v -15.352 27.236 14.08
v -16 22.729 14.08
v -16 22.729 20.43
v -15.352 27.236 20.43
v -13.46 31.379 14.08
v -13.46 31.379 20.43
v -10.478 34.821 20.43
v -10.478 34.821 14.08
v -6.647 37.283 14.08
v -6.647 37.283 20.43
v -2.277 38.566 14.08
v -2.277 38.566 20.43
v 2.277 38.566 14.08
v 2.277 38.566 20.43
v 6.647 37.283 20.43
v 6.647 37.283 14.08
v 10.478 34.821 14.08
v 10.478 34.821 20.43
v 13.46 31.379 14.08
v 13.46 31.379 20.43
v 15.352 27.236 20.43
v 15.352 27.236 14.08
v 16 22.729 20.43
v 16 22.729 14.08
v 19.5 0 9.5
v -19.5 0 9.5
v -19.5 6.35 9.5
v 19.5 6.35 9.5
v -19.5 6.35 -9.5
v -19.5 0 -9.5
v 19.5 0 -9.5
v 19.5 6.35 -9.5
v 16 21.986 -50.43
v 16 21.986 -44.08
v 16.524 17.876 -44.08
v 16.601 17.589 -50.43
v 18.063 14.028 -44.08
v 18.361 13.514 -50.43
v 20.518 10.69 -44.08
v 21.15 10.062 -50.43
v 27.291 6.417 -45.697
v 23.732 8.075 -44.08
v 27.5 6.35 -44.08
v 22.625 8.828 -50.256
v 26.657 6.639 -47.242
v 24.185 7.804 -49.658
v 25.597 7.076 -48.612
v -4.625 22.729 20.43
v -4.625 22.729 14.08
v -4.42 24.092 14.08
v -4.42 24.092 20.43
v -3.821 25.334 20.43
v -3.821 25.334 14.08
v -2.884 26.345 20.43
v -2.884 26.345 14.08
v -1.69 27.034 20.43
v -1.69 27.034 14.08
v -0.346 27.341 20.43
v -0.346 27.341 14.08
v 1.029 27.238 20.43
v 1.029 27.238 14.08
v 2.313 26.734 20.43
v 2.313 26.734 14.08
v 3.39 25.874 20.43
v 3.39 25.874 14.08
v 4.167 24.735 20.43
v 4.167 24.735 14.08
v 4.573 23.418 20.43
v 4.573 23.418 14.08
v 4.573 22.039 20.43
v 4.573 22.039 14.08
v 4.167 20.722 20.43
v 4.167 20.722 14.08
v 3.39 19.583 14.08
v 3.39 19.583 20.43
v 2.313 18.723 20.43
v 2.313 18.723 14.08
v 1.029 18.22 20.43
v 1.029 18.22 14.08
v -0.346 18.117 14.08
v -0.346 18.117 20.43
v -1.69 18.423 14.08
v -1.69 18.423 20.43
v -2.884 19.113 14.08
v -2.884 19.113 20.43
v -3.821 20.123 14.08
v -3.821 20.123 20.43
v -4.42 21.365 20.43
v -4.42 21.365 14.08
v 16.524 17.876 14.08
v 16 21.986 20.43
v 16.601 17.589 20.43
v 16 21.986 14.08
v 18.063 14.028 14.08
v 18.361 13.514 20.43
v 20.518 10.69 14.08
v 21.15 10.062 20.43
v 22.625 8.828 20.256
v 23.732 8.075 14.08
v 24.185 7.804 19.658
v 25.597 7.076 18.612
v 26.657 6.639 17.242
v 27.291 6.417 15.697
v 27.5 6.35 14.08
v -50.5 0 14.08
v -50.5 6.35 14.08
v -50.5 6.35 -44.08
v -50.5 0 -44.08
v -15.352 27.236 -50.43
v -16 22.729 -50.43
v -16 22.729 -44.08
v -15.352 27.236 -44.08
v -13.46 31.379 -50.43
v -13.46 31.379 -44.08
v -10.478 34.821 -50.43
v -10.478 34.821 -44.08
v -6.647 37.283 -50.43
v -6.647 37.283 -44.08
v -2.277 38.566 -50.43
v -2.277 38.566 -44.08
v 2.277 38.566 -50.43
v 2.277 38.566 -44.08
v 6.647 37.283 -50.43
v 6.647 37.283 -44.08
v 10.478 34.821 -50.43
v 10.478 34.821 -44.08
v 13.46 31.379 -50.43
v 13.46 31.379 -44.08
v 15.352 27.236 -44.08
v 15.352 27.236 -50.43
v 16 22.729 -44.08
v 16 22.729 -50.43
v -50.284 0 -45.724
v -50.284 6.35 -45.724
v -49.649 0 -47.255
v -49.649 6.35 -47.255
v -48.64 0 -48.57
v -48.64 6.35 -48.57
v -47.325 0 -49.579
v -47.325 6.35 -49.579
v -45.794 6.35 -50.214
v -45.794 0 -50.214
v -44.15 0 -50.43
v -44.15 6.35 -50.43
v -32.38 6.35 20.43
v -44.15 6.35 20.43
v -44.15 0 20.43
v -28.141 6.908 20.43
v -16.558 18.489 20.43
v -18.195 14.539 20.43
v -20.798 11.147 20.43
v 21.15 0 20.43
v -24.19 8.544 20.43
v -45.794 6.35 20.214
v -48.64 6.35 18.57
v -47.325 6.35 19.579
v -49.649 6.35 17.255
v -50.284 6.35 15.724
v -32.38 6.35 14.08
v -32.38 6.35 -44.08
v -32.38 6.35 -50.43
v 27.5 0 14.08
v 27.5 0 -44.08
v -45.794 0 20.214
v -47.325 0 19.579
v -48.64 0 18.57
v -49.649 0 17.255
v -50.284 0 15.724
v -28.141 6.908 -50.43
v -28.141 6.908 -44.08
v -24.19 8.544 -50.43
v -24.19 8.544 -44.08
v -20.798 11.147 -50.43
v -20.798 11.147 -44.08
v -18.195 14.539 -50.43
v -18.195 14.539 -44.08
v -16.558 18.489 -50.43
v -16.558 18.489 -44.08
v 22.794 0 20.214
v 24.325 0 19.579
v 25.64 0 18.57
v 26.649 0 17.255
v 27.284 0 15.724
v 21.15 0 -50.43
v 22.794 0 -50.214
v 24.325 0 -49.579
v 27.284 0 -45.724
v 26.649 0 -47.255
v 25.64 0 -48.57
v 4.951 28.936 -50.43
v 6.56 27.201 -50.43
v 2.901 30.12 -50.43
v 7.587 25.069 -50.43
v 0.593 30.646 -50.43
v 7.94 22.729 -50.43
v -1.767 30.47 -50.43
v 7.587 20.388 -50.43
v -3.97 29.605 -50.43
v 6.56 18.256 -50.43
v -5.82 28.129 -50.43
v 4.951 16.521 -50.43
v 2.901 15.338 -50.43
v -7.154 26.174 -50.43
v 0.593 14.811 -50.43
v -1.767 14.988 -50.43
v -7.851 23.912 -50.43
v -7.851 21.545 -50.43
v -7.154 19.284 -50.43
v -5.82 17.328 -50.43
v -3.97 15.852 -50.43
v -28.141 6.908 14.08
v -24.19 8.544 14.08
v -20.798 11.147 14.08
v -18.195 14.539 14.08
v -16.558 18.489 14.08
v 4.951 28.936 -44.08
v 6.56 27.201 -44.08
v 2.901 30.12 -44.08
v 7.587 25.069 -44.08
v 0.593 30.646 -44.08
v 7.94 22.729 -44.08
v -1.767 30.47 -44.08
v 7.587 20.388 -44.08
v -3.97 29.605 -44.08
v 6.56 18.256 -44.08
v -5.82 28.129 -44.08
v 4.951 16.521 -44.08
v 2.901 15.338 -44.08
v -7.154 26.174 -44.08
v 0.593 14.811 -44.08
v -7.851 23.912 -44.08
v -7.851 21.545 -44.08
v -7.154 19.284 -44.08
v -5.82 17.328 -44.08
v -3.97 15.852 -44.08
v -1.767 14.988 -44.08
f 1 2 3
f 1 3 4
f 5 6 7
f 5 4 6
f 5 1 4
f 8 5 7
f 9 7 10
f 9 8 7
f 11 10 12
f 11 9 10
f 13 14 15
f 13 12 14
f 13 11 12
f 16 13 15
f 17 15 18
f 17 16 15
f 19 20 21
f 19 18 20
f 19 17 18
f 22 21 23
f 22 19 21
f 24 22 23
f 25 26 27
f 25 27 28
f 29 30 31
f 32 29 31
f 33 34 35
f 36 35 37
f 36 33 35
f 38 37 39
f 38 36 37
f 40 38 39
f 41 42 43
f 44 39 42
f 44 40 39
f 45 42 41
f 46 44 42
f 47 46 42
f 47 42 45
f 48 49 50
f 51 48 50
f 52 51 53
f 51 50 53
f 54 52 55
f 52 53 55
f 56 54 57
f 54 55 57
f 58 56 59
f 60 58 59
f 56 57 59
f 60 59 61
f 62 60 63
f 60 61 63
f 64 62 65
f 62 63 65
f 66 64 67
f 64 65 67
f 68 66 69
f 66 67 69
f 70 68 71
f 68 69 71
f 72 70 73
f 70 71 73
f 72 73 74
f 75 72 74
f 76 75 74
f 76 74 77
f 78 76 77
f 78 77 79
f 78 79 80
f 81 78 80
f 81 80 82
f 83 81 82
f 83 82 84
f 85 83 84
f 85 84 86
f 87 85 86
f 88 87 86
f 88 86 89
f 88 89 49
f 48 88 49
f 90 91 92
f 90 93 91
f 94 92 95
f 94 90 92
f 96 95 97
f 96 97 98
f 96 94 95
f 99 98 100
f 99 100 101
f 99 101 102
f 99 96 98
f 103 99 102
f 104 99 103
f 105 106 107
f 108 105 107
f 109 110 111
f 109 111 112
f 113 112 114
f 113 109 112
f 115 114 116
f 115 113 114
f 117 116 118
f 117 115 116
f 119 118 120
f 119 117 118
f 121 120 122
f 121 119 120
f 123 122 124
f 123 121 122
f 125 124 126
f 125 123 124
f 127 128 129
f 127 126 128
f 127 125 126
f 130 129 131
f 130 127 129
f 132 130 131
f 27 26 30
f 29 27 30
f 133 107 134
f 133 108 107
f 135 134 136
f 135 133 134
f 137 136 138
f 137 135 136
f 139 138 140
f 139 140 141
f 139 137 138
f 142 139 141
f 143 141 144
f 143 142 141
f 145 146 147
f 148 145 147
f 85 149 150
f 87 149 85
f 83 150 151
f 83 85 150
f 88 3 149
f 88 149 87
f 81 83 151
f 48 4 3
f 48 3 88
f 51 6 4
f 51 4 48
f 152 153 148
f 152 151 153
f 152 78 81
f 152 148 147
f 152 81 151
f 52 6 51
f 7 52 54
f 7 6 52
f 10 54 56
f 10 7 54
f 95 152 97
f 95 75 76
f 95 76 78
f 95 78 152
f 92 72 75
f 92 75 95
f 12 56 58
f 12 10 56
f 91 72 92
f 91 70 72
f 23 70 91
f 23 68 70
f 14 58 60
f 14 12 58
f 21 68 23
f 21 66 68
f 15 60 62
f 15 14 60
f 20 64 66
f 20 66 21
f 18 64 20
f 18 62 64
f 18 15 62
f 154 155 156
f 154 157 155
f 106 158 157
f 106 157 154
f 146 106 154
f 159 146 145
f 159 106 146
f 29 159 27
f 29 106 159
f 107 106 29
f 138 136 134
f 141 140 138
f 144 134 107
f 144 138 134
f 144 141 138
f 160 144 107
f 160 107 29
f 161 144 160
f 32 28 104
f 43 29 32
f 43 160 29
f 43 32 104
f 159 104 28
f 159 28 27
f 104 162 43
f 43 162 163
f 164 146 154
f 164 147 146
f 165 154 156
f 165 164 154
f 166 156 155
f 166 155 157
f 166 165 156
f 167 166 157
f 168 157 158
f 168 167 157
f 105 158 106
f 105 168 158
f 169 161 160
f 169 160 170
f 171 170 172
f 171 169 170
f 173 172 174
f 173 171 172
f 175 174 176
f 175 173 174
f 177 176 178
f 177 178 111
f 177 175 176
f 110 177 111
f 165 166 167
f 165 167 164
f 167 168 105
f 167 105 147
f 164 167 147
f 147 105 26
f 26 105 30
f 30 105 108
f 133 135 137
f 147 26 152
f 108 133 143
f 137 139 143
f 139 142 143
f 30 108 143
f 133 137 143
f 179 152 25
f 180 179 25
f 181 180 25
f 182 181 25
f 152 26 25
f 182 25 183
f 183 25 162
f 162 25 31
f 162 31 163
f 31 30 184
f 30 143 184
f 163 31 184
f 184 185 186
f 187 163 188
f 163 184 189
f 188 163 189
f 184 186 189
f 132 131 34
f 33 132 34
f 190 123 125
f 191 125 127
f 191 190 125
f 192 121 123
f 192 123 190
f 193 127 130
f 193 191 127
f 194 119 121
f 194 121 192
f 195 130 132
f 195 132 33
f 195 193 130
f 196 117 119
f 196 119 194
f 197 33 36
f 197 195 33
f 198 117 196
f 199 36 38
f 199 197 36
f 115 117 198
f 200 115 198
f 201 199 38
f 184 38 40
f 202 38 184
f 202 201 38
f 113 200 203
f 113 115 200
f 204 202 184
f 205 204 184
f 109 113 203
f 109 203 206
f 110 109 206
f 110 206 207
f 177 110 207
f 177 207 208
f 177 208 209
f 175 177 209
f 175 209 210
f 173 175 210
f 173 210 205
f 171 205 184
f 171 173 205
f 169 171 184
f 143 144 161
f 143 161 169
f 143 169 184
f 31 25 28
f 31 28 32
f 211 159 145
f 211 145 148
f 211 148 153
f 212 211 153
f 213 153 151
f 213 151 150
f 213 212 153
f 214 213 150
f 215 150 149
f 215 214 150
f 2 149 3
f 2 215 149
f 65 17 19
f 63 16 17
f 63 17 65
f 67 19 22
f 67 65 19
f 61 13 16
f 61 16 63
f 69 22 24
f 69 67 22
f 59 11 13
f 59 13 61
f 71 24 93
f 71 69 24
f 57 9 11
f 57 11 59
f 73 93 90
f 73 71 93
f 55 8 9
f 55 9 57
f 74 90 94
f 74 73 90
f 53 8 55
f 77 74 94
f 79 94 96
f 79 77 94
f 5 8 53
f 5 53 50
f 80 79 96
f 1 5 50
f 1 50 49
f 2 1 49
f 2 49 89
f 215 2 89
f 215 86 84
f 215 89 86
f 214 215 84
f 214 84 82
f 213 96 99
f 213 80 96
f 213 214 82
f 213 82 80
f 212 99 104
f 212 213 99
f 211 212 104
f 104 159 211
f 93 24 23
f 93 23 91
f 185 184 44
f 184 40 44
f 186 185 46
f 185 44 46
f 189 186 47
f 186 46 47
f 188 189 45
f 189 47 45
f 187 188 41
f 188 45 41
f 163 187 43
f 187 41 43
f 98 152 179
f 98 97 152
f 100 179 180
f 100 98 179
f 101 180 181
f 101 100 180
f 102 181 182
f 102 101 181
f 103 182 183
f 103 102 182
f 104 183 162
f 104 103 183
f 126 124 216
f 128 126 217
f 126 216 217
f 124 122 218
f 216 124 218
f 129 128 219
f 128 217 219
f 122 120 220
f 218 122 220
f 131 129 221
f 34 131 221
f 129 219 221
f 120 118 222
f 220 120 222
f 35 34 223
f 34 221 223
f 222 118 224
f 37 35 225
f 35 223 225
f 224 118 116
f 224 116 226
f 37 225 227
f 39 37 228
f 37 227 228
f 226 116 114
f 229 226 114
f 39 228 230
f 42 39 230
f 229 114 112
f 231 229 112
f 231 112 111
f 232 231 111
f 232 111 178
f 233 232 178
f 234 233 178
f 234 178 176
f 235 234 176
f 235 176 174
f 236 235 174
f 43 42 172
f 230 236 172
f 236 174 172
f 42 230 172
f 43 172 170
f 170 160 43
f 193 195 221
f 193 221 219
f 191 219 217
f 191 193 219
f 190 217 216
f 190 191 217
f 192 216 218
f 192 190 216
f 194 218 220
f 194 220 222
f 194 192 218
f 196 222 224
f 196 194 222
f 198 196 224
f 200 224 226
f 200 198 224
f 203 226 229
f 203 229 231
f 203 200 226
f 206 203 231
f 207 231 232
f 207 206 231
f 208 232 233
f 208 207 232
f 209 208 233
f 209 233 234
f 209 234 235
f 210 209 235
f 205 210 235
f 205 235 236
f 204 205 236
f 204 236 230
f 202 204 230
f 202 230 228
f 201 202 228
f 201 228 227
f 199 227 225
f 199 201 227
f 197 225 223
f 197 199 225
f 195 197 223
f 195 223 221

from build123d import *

# Parameters (mm, degrees)
SKETCH1_W            = 55
SKETCH1_H            = 70.86
SKETCH1_W_2          = 39
SKETCH1_H_2          = 19
BOSS_EXTRUDE1_DEPTH  = 6.35
SKETCH12_R           = 7.94
BOSS_EXTRUDE11_DEPTH = 6.35
BOSS_EXTRUDE14_START = -6.35
BOSS_EXTRUDE14_DEPTH = 6.35
SKETCH15_W           = 23
SKETCH15_H           = 70.86
BOSS_EXTRUDE13_DEPTH = 6.35
FILLET2_R            = 16.38
FILLET3_R            = 6.35
CUT_EXTRUDE1_REACH   = 92.618
SKETCH17_R           = 4.625


with BuildPart() as part:
    # Sketch1 → Boss-Extrude1 (new body)
    with BuildSketch(Plane(origin=(0, 0, 0), x_dir=(1, 0, 0), z_dir=(0, 1, 0))):
        with Locations((0, 15)):
            Rectangle(SKETCH1_W, SKETCH1_H)
        Rectangle(SKETCH1_W_2, SKETCH1_H_2, mode=Mode.SUBTRACT)
    extrude(amount=BOSS_EXTRUDE1_DEPTH)

    # Sketch12 → Boss-Extrude11 (add)
    with BuildSketch(Plane.XY.offset(-50.43)):
        with BuildLine():
            Line((16, 22.728660684), (16, 6.35))
            Line((16, 6.35), (-16, 6.35))
            Line((-16, 6.35), (-16, 22.728660684))
            ThreePointArc((-16, 22.728660684), (0, 38.728660684), (16, 22.728660684))
        make_face()
        with Locations((0, 22.728660684)):
            Circle(SKETCH12_R, mode=Mode.SUBTRACT)
    extrude(amount=BOSS_EXTRUDE11_DEPTH)

    # Sketch16 → Boss-Extrude14 (add)
    with BuildSketch(Plane.XY.offset(20.43).offset(BOSS_EXTRUDE14_START)):
        with BuildLine():
            Line((-16, 6.35), (-16, 22.728660684))
            ThreePointArc((-16, 22.728660684), (0, 38.728660684), (16, 22.728660684))
            Line((16, 22.728660684), (16, 6.35))
            Line((16, 6.35), (-16, 6.35))
        make_face()
    extrude(amount=BOSS_EXTRUDE14_DEPTH)

    # Sketch15 → Boss-Extrude13 (add)
    with BuildSketch(Plane(origin=(0, 6.35, 0), x_dir=(1, 0, 0), z_dir=(0, 1, 0))):
        with Locations((-39, 15)):
            Rectangle(SKETCH15_W, SKETCH15_H)
    extrude(amount=-BOSS_EXTRUDE13_DEPTH)

    # Fillet2
    # the kernel refuses this fillet: 16.38 mm, written as the material it adds along each edge
    with BuildSketch(Plane(origin=(16, 6.35, -50.43), x_dir=(0, 1, 0), z_dir=(0, 0, 1)), Plane(origin=(16, 6.35, 14.08), x_dir=(0, 1, 0), z_dir=(0, 0, 1))) as fillet2_piece_1:
        with BuildLine():
            CenterArc((15.636176003, -16.38), FILLET2_R, 90, 72.667025782)
            Line((0, -11.5), (0, 0))
            Line((0, 0), (15.636176003, 0))
        make_face()
    fillet2_piece_1_solid = extrude(amount=6.35, mode=Mode.PRIVATE)
    with BuildSketch(Plane(origin=(-16, 6.35, 14.08), x_dir=(8.356150350670102e-10, 1.0, 0), z_dir=(0, 0, 1)), Plane(origin=(-16, 6.35, -50.43), x_dir=(8.356150350670102e-10, 1.0, 0), z_dir=(0, 0, 1))) as fillet2_piece_2:
        with BuildLine():
            CenterArc((16.379999986, 16.379999986), FILLET2_R, 180.000000048, 89.997630107)
            Line((-1.4e-08, 16.379999972), (-1.638000014, 16.379999971))
            Line((-1.638000014, 16.379999971), (-1.637999999, -1.638000001))
            Line((-1.637999999, -1.638000001), (16.379254733, -1.637999999))
            Line((16.379254733, -1.637999999), (16.379322483, 0))
        make_face()
    fillet2_piece_2_solid = extrude(amount=6.35, mode=Mode.PRIVATE)
    add([fillet2_piece_1_solid, fillet2_piece_2_solid])

    # Fillet3
    fillet3_edges = [part.edges().sort_by_distance(p)[0] for p in [
        (27.5, 3.175, -50.43),
        (27.5, 3.175, 20.43),
        (-50.5, 3.175, 20.43),
        (-50.5, 3.175, -50.43),
    ]]
    fillet(fillet3_edges, radius=FILLET3_R)

    # Sketch17 → Cut-Extrude1 (cut, up to next)
    with BuildSketch(Plane(origin=(0, 0, 14.08), x_dir=(-1, 0, 0), z_dir=(0, 0, -1)), mode=Mode.PRIVATE) as cut_extrude1_sk1:
        with Locations((0, 22.728660684)):
            Circle(SKETCH17_R)
    cut_extrude1_tool1 = extrude(cut_extrude1_sk1.sketch, amount=-CUT_EXTRUDE1_REACH, mode=Mode.PRIVATE) & part.part
    add(cut_extrude1_tool1.solids().sort_by_distance((0, 22.728661, 14.08))[0], mode=Mode.SUBTRACT)


solid = part.part
